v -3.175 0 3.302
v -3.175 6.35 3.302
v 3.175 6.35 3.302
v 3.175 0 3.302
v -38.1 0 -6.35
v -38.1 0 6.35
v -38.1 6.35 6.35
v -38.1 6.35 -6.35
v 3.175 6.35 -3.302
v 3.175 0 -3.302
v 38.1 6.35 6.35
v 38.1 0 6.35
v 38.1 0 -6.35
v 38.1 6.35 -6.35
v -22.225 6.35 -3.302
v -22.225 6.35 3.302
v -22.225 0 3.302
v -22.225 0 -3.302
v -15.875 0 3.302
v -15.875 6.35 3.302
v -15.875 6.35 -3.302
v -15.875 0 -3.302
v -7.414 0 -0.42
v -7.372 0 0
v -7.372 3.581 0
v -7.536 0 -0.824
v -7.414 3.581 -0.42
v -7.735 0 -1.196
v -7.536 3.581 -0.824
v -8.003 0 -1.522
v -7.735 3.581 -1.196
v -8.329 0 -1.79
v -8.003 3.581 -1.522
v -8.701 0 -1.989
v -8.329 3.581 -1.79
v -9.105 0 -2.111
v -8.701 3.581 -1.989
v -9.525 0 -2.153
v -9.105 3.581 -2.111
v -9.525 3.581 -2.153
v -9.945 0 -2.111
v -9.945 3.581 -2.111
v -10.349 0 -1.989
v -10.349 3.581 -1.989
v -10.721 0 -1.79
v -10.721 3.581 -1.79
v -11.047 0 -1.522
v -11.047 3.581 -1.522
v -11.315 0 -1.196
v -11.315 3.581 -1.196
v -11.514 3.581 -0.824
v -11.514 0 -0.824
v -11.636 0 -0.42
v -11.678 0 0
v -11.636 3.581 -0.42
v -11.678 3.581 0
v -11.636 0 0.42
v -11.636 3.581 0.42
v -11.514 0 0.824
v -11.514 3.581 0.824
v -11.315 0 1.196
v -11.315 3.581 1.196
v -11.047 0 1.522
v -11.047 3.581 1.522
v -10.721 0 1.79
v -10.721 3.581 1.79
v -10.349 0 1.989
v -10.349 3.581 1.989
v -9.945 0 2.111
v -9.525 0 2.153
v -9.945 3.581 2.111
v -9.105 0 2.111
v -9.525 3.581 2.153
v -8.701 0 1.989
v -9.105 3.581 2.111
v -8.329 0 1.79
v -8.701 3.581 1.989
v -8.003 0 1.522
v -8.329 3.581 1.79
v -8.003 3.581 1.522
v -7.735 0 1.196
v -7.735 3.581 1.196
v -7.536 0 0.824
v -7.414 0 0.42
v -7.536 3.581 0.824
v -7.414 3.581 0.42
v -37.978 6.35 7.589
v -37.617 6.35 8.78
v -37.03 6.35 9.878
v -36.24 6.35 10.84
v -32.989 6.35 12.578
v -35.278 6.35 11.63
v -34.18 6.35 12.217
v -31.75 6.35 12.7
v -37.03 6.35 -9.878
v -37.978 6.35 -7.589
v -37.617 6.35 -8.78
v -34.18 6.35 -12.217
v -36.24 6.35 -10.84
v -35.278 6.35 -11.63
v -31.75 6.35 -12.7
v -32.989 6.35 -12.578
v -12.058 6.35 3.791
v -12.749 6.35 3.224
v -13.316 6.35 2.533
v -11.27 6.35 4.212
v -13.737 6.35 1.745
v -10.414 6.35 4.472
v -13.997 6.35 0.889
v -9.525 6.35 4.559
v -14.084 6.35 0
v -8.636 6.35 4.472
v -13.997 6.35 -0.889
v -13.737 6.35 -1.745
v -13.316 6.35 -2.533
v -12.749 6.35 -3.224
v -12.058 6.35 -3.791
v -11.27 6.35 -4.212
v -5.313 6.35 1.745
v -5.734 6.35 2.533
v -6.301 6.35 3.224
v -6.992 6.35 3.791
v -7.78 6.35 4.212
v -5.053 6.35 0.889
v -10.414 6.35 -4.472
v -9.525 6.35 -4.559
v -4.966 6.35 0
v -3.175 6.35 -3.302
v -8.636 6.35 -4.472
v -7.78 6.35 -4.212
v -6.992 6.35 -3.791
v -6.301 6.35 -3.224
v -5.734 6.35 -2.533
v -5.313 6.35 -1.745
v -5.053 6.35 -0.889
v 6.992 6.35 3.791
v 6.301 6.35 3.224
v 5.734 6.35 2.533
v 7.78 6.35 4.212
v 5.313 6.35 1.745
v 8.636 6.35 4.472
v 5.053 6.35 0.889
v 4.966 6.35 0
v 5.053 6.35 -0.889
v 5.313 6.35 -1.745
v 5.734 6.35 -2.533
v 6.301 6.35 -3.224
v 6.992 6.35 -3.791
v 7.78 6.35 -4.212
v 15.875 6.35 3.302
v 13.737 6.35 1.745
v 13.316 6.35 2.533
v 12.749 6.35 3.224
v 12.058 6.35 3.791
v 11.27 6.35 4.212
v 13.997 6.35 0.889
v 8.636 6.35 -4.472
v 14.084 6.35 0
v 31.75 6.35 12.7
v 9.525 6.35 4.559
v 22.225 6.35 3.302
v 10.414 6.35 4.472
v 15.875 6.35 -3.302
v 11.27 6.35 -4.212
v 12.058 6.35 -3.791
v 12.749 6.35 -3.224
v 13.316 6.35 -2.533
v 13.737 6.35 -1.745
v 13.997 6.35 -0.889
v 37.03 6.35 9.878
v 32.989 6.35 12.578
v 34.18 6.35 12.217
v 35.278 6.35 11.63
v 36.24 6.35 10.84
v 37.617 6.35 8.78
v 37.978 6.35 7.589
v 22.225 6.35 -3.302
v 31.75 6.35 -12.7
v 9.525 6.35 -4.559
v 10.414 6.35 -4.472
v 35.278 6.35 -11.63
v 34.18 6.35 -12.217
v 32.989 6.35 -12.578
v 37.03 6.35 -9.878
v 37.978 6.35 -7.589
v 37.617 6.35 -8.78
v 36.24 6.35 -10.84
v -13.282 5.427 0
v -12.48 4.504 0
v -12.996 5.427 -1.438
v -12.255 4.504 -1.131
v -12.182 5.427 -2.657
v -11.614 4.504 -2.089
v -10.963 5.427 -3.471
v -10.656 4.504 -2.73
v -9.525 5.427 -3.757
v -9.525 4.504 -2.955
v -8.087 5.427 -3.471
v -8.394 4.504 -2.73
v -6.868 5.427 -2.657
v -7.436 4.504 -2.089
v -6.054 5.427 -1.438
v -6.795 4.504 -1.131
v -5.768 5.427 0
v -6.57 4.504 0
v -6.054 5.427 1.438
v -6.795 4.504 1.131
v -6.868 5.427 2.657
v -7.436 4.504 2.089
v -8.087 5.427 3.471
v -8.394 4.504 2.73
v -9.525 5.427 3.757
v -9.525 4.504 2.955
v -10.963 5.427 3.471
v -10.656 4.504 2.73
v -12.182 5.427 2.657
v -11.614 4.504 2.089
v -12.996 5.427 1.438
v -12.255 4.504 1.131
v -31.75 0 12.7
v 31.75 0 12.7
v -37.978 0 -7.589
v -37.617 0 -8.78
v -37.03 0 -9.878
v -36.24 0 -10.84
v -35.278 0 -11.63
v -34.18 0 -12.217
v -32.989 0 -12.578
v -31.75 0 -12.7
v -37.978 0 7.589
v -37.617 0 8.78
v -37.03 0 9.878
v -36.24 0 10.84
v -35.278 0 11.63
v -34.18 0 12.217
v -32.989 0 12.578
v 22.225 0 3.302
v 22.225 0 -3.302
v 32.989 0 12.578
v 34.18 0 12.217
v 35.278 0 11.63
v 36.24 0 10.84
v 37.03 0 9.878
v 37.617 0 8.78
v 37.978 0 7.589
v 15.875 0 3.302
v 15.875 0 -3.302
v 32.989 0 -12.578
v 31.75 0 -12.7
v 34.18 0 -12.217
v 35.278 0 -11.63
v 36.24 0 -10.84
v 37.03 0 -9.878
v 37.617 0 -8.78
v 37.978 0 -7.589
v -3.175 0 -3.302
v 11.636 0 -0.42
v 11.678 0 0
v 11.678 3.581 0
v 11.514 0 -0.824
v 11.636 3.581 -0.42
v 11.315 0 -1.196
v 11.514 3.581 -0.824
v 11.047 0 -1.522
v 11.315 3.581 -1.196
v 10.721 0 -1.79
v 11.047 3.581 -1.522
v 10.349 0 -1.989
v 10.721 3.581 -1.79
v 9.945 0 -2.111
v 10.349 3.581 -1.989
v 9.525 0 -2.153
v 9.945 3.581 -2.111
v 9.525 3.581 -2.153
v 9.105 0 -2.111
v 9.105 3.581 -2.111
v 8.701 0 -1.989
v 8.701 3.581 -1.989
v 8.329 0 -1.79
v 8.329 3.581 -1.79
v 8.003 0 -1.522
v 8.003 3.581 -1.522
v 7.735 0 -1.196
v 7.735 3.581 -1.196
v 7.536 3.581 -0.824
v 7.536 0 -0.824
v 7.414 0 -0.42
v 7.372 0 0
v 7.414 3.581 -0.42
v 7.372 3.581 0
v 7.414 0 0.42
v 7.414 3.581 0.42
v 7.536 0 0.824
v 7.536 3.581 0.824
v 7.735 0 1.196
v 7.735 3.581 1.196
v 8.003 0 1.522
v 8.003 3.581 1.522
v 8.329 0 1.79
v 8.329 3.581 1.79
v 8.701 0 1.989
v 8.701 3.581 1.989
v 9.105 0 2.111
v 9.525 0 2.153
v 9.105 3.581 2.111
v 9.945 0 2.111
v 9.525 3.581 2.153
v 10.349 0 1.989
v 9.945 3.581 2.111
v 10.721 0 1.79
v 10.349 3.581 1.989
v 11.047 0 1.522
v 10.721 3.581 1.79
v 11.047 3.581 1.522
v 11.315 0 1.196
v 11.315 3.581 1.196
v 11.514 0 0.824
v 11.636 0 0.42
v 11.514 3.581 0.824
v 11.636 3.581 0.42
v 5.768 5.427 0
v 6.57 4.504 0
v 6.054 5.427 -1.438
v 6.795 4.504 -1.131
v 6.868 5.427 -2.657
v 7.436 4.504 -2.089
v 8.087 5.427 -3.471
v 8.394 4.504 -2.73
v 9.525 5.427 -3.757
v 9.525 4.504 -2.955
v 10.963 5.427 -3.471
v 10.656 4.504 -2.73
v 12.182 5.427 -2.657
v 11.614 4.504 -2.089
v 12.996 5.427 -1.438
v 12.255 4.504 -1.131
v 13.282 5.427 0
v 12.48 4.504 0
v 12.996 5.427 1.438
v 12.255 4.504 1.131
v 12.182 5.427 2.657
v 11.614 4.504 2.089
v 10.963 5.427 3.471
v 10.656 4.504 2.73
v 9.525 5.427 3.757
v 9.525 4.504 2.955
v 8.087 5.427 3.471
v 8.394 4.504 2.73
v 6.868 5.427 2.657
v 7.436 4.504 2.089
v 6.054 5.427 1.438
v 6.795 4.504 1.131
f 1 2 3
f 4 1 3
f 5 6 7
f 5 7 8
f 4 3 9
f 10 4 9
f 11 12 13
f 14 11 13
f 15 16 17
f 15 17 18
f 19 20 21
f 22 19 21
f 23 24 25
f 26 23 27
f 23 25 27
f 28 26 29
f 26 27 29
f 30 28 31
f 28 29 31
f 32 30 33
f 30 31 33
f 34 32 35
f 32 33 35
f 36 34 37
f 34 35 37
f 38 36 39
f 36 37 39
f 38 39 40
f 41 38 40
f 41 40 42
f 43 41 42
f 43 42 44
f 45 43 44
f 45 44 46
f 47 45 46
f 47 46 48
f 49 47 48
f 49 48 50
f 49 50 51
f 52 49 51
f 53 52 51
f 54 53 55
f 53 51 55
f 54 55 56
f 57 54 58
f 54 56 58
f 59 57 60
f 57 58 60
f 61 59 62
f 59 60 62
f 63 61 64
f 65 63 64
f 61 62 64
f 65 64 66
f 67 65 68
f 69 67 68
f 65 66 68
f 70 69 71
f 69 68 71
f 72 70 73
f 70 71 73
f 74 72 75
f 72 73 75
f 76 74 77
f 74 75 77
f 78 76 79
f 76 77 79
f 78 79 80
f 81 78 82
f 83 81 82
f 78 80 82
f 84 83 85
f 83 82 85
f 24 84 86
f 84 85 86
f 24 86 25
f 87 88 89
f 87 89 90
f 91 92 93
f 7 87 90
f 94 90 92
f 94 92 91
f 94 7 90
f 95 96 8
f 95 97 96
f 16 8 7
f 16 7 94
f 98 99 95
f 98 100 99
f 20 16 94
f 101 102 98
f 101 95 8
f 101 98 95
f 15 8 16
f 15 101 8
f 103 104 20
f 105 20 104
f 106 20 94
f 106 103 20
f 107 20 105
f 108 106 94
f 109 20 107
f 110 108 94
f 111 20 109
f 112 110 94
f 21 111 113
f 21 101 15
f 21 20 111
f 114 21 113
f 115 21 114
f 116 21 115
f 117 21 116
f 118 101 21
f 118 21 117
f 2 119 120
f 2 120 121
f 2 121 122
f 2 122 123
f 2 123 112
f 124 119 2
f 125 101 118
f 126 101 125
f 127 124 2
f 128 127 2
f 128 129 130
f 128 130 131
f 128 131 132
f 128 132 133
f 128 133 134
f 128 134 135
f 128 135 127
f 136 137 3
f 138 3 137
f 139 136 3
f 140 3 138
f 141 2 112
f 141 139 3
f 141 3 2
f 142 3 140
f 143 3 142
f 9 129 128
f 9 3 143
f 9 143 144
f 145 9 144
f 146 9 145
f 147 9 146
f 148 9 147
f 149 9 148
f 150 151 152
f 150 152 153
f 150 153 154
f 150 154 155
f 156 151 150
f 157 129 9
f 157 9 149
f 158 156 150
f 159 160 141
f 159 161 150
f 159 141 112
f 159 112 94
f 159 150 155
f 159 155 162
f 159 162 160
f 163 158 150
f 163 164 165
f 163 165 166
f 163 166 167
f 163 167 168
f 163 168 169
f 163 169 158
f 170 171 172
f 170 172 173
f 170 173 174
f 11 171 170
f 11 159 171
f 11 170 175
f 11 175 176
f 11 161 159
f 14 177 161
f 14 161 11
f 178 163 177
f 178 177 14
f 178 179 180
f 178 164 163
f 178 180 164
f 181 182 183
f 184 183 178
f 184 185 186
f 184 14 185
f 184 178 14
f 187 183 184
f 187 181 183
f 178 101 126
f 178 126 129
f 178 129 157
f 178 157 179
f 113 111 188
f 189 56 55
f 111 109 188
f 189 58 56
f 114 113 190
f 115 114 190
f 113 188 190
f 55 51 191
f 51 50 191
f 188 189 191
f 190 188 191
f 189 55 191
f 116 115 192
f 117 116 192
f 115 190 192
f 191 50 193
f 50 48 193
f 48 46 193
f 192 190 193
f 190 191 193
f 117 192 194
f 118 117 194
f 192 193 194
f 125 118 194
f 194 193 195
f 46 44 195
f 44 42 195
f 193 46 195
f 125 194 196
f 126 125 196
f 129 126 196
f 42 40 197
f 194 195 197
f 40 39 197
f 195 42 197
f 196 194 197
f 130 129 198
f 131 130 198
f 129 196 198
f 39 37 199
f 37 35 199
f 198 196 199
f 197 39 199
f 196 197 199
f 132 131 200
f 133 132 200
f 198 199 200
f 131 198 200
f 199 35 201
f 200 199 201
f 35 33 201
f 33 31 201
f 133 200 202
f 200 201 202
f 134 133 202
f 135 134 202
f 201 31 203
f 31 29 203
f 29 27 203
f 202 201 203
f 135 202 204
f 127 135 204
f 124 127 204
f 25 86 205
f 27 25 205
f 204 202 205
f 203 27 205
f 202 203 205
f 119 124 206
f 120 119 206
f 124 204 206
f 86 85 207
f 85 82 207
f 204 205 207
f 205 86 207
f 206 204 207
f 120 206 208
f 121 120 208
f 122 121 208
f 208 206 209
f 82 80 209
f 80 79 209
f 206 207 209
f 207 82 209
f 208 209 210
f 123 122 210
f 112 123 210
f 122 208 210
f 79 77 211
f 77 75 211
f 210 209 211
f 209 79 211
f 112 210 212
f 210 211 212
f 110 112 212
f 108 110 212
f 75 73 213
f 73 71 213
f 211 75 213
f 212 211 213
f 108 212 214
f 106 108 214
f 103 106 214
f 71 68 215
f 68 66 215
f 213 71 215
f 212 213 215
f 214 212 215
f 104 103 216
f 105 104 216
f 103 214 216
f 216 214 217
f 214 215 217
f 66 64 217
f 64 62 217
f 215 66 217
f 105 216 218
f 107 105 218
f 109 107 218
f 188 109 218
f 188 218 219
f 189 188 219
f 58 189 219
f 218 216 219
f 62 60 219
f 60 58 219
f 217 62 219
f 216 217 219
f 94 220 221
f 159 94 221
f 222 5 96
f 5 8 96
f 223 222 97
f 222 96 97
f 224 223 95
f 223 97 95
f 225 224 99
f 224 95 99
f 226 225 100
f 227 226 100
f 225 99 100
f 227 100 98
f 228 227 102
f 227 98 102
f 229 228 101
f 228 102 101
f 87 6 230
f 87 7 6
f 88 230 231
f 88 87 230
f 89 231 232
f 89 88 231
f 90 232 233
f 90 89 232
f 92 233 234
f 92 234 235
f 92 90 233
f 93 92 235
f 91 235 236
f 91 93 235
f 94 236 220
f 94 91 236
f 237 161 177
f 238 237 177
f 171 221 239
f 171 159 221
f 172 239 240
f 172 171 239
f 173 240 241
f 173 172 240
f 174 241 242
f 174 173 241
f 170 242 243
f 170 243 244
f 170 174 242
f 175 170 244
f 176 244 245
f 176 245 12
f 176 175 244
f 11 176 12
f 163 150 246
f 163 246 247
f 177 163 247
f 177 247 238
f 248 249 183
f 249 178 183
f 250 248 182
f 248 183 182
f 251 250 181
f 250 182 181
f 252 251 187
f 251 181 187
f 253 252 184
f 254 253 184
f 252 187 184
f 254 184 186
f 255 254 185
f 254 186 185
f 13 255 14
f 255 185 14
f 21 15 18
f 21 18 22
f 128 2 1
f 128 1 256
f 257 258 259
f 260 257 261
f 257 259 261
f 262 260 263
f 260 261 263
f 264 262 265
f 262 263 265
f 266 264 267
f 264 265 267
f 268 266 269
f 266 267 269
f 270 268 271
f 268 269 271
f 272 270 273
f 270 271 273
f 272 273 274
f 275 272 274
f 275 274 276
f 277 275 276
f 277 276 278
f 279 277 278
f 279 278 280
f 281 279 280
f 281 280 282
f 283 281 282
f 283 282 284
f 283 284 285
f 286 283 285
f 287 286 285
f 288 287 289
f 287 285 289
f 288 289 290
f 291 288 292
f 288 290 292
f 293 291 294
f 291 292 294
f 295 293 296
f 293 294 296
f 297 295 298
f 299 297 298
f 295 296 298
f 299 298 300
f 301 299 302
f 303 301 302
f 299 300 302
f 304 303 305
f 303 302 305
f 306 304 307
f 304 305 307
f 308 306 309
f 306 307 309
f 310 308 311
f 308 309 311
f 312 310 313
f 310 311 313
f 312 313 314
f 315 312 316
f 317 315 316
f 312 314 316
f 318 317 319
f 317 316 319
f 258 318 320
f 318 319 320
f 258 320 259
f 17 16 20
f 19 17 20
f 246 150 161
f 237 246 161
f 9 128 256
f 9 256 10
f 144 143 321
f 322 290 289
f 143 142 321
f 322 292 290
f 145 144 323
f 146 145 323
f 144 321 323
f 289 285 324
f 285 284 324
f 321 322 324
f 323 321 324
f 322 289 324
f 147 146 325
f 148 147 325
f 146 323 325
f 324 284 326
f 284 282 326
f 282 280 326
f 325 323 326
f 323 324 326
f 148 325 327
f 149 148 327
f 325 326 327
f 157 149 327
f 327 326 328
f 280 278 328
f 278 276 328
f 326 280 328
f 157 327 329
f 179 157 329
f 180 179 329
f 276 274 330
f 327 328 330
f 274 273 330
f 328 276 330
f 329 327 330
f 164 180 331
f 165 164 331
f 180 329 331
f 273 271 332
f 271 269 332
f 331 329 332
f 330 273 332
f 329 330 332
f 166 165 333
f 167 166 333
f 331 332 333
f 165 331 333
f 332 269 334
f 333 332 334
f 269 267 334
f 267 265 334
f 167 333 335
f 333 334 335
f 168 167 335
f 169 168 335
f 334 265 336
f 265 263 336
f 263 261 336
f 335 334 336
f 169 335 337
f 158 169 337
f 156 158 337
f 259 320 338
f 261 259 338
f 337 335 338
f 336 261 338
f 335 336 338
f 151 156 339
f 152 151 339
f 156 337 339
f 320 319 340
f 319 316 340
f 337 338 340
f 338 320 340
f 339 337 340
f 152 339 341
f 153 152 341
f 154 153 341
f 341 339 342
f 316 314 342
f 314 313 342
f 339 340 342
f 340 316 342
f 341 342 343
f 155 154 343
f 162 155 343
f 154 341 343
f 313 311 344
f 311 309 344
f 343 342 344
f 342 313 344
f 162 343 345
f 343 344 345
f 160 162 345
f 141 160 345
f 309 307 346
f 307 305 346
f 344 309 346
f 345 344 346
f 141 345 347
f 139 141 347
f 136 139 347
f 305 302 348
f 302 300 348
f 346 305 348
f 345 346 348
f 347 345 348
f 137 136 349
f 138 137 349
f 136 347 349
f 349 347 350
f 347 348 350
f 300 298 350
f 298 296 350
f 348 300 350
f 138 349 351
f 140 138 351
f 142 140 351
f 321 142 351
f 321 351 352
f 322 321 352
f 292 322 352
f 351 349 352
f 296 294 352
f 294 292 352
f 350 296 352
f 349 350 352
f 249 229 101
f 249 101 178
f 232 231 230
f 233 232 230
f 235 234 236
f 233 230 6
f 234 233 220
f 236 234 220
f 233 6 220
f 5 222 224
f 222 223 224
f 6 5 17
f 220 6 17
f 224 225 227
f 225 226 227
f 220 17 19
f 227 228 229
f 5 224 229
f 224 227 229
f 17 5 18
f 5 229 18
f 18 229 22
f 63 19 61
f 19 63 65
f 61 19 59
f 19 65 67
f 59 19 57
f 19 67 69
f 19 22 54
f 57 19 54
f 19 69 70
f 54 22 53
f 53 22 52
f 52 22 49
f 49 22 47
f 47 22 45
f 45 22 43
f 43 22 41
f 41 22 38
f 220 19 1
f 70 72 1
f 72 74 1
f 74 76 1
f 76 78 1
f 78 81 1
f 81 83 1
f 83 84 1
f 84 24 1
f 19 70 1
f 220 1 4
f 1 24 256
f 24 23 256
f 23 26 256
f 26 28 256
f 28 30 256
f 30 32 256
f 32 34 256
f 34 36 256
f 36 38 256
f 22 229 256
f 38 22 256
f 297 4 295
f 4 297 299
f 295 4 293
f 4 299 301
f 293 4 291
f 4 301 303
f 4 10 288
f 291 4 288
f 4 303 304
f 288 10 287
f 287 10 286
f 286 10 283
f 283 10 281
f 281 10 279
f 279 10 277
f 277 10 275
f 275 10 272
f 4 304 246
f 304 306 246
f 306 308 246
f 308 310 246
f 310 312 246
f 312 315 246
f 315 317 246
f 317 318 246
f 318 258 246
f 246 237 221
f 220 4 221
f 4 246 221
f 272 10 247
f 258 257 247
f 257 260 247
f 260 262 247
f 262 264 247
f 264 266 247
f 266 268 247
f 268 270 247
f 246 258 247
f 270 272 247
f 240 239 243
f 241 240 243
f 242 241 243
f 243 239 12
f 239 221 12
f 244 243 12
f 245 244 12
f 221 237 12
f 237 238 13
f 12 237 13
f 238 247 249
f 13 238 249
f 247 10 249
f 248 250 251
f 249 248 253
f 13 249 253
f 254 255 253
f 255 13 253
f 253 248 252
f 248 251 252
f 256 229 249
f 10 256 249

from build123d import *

# Parameters (mm, degrees)
SKETCH1_W                                         = 76.2
SKETCH1_H                                         = 25.4
BOSS_EXTRUDE1_DEPTH                               = 6.35
SKETCH2_R                                         = 2.15265
SKETCH2_W                                         = 6.35
SKETCH2_H                                         = 6.604
CUT_EXTRUDE1_DEPTH                                = 7.35
FILLET1_R                                         = 6.35
CSK_FOR_8_FLAT_HEAD_SOCKET_CAP_SCREW1_D           = 4.3053
CSK_FOR_8_FLAT_HEAD_SOCKET_CAP_SCREW1_CSINK_D     = 9.1186
CSK_FOR_8_FLAT_HEAD_SOCKET_CAP_SCREW1_CSINK_ANGLE = 82


with BuildPart() as part:
    # Sketch1 → Boss-Extrude1 (new body)
    with BuildSketch(Plane(origin=(0, 0, 0), x_dir=(1, 0, 0), z_dir=(0, 1, 0))):
        Rectangle(SKETCH1_W, SKETCH1_H)
    extrude(amount=BOSS_EXTRUDE1_DEPTH)

    # Sketch2 → Cut-Extrude1 (cut, through all)
    with BuildSketch(Plane(origin=(0, 6.35, 0), x_dir=(1, 0, 0), z_dir=(0, 1, 0))):
        with Locations((-9.525, 0)):
            Circle(SKETCH2_R)
        with Locations((9.525, 0)):
            Circle(SKETCH2_R)
        Rectangle(SKETCH2_W, SKETCH2_H)
        with Locations((-19.05, 0)):
            Rectangle(SKETCH2_W, SKETCH2_H)
        with Locations((19.05, 0)):
            Rectangle(SKETCH2_W, SKETCH2_H)
    extrude(amount=-CUT_EXTRUDE1_DEPTH, mode=Mode.SUBTRACT)

    # Fillet1
    fillet1_edges = [part.edges().sort_by_distance(p)[0] for p in [
        (-38.1, 3.175, -12.7),
        (38.1, 3.175, -12.7),
        (38.1, 3.175, 12.7),
        (-38.1, 3.175, 12.7),
    ]]
    fillet(fillet1_edges, radius=FILLET1_R)

    # CSK for #8 Flat Head Socket Cap Screw1 (through all)
    with Locations(Plane(origin=(0, 6.35, 0), x_dir=(1, 0, 0), z_dir=(0, 1, 0))):
        with Locations((-9.525, 0), (9.525, 0)):
            CounterSinkHole(CSK_FOR_8_FLAT_HEAD_SOCKET_CAP_SCREW1_D / 2, CSK_FOR_8_FLAT_HEAD_SOCKET_CAP_SCREW1_CSINK_D / 2, counter_sink_angle=CSK_FOR_8_FLAT_HEAD_SOCKET_CAP_SCREW1_CSINK_ANGLE)


solid = part.part
